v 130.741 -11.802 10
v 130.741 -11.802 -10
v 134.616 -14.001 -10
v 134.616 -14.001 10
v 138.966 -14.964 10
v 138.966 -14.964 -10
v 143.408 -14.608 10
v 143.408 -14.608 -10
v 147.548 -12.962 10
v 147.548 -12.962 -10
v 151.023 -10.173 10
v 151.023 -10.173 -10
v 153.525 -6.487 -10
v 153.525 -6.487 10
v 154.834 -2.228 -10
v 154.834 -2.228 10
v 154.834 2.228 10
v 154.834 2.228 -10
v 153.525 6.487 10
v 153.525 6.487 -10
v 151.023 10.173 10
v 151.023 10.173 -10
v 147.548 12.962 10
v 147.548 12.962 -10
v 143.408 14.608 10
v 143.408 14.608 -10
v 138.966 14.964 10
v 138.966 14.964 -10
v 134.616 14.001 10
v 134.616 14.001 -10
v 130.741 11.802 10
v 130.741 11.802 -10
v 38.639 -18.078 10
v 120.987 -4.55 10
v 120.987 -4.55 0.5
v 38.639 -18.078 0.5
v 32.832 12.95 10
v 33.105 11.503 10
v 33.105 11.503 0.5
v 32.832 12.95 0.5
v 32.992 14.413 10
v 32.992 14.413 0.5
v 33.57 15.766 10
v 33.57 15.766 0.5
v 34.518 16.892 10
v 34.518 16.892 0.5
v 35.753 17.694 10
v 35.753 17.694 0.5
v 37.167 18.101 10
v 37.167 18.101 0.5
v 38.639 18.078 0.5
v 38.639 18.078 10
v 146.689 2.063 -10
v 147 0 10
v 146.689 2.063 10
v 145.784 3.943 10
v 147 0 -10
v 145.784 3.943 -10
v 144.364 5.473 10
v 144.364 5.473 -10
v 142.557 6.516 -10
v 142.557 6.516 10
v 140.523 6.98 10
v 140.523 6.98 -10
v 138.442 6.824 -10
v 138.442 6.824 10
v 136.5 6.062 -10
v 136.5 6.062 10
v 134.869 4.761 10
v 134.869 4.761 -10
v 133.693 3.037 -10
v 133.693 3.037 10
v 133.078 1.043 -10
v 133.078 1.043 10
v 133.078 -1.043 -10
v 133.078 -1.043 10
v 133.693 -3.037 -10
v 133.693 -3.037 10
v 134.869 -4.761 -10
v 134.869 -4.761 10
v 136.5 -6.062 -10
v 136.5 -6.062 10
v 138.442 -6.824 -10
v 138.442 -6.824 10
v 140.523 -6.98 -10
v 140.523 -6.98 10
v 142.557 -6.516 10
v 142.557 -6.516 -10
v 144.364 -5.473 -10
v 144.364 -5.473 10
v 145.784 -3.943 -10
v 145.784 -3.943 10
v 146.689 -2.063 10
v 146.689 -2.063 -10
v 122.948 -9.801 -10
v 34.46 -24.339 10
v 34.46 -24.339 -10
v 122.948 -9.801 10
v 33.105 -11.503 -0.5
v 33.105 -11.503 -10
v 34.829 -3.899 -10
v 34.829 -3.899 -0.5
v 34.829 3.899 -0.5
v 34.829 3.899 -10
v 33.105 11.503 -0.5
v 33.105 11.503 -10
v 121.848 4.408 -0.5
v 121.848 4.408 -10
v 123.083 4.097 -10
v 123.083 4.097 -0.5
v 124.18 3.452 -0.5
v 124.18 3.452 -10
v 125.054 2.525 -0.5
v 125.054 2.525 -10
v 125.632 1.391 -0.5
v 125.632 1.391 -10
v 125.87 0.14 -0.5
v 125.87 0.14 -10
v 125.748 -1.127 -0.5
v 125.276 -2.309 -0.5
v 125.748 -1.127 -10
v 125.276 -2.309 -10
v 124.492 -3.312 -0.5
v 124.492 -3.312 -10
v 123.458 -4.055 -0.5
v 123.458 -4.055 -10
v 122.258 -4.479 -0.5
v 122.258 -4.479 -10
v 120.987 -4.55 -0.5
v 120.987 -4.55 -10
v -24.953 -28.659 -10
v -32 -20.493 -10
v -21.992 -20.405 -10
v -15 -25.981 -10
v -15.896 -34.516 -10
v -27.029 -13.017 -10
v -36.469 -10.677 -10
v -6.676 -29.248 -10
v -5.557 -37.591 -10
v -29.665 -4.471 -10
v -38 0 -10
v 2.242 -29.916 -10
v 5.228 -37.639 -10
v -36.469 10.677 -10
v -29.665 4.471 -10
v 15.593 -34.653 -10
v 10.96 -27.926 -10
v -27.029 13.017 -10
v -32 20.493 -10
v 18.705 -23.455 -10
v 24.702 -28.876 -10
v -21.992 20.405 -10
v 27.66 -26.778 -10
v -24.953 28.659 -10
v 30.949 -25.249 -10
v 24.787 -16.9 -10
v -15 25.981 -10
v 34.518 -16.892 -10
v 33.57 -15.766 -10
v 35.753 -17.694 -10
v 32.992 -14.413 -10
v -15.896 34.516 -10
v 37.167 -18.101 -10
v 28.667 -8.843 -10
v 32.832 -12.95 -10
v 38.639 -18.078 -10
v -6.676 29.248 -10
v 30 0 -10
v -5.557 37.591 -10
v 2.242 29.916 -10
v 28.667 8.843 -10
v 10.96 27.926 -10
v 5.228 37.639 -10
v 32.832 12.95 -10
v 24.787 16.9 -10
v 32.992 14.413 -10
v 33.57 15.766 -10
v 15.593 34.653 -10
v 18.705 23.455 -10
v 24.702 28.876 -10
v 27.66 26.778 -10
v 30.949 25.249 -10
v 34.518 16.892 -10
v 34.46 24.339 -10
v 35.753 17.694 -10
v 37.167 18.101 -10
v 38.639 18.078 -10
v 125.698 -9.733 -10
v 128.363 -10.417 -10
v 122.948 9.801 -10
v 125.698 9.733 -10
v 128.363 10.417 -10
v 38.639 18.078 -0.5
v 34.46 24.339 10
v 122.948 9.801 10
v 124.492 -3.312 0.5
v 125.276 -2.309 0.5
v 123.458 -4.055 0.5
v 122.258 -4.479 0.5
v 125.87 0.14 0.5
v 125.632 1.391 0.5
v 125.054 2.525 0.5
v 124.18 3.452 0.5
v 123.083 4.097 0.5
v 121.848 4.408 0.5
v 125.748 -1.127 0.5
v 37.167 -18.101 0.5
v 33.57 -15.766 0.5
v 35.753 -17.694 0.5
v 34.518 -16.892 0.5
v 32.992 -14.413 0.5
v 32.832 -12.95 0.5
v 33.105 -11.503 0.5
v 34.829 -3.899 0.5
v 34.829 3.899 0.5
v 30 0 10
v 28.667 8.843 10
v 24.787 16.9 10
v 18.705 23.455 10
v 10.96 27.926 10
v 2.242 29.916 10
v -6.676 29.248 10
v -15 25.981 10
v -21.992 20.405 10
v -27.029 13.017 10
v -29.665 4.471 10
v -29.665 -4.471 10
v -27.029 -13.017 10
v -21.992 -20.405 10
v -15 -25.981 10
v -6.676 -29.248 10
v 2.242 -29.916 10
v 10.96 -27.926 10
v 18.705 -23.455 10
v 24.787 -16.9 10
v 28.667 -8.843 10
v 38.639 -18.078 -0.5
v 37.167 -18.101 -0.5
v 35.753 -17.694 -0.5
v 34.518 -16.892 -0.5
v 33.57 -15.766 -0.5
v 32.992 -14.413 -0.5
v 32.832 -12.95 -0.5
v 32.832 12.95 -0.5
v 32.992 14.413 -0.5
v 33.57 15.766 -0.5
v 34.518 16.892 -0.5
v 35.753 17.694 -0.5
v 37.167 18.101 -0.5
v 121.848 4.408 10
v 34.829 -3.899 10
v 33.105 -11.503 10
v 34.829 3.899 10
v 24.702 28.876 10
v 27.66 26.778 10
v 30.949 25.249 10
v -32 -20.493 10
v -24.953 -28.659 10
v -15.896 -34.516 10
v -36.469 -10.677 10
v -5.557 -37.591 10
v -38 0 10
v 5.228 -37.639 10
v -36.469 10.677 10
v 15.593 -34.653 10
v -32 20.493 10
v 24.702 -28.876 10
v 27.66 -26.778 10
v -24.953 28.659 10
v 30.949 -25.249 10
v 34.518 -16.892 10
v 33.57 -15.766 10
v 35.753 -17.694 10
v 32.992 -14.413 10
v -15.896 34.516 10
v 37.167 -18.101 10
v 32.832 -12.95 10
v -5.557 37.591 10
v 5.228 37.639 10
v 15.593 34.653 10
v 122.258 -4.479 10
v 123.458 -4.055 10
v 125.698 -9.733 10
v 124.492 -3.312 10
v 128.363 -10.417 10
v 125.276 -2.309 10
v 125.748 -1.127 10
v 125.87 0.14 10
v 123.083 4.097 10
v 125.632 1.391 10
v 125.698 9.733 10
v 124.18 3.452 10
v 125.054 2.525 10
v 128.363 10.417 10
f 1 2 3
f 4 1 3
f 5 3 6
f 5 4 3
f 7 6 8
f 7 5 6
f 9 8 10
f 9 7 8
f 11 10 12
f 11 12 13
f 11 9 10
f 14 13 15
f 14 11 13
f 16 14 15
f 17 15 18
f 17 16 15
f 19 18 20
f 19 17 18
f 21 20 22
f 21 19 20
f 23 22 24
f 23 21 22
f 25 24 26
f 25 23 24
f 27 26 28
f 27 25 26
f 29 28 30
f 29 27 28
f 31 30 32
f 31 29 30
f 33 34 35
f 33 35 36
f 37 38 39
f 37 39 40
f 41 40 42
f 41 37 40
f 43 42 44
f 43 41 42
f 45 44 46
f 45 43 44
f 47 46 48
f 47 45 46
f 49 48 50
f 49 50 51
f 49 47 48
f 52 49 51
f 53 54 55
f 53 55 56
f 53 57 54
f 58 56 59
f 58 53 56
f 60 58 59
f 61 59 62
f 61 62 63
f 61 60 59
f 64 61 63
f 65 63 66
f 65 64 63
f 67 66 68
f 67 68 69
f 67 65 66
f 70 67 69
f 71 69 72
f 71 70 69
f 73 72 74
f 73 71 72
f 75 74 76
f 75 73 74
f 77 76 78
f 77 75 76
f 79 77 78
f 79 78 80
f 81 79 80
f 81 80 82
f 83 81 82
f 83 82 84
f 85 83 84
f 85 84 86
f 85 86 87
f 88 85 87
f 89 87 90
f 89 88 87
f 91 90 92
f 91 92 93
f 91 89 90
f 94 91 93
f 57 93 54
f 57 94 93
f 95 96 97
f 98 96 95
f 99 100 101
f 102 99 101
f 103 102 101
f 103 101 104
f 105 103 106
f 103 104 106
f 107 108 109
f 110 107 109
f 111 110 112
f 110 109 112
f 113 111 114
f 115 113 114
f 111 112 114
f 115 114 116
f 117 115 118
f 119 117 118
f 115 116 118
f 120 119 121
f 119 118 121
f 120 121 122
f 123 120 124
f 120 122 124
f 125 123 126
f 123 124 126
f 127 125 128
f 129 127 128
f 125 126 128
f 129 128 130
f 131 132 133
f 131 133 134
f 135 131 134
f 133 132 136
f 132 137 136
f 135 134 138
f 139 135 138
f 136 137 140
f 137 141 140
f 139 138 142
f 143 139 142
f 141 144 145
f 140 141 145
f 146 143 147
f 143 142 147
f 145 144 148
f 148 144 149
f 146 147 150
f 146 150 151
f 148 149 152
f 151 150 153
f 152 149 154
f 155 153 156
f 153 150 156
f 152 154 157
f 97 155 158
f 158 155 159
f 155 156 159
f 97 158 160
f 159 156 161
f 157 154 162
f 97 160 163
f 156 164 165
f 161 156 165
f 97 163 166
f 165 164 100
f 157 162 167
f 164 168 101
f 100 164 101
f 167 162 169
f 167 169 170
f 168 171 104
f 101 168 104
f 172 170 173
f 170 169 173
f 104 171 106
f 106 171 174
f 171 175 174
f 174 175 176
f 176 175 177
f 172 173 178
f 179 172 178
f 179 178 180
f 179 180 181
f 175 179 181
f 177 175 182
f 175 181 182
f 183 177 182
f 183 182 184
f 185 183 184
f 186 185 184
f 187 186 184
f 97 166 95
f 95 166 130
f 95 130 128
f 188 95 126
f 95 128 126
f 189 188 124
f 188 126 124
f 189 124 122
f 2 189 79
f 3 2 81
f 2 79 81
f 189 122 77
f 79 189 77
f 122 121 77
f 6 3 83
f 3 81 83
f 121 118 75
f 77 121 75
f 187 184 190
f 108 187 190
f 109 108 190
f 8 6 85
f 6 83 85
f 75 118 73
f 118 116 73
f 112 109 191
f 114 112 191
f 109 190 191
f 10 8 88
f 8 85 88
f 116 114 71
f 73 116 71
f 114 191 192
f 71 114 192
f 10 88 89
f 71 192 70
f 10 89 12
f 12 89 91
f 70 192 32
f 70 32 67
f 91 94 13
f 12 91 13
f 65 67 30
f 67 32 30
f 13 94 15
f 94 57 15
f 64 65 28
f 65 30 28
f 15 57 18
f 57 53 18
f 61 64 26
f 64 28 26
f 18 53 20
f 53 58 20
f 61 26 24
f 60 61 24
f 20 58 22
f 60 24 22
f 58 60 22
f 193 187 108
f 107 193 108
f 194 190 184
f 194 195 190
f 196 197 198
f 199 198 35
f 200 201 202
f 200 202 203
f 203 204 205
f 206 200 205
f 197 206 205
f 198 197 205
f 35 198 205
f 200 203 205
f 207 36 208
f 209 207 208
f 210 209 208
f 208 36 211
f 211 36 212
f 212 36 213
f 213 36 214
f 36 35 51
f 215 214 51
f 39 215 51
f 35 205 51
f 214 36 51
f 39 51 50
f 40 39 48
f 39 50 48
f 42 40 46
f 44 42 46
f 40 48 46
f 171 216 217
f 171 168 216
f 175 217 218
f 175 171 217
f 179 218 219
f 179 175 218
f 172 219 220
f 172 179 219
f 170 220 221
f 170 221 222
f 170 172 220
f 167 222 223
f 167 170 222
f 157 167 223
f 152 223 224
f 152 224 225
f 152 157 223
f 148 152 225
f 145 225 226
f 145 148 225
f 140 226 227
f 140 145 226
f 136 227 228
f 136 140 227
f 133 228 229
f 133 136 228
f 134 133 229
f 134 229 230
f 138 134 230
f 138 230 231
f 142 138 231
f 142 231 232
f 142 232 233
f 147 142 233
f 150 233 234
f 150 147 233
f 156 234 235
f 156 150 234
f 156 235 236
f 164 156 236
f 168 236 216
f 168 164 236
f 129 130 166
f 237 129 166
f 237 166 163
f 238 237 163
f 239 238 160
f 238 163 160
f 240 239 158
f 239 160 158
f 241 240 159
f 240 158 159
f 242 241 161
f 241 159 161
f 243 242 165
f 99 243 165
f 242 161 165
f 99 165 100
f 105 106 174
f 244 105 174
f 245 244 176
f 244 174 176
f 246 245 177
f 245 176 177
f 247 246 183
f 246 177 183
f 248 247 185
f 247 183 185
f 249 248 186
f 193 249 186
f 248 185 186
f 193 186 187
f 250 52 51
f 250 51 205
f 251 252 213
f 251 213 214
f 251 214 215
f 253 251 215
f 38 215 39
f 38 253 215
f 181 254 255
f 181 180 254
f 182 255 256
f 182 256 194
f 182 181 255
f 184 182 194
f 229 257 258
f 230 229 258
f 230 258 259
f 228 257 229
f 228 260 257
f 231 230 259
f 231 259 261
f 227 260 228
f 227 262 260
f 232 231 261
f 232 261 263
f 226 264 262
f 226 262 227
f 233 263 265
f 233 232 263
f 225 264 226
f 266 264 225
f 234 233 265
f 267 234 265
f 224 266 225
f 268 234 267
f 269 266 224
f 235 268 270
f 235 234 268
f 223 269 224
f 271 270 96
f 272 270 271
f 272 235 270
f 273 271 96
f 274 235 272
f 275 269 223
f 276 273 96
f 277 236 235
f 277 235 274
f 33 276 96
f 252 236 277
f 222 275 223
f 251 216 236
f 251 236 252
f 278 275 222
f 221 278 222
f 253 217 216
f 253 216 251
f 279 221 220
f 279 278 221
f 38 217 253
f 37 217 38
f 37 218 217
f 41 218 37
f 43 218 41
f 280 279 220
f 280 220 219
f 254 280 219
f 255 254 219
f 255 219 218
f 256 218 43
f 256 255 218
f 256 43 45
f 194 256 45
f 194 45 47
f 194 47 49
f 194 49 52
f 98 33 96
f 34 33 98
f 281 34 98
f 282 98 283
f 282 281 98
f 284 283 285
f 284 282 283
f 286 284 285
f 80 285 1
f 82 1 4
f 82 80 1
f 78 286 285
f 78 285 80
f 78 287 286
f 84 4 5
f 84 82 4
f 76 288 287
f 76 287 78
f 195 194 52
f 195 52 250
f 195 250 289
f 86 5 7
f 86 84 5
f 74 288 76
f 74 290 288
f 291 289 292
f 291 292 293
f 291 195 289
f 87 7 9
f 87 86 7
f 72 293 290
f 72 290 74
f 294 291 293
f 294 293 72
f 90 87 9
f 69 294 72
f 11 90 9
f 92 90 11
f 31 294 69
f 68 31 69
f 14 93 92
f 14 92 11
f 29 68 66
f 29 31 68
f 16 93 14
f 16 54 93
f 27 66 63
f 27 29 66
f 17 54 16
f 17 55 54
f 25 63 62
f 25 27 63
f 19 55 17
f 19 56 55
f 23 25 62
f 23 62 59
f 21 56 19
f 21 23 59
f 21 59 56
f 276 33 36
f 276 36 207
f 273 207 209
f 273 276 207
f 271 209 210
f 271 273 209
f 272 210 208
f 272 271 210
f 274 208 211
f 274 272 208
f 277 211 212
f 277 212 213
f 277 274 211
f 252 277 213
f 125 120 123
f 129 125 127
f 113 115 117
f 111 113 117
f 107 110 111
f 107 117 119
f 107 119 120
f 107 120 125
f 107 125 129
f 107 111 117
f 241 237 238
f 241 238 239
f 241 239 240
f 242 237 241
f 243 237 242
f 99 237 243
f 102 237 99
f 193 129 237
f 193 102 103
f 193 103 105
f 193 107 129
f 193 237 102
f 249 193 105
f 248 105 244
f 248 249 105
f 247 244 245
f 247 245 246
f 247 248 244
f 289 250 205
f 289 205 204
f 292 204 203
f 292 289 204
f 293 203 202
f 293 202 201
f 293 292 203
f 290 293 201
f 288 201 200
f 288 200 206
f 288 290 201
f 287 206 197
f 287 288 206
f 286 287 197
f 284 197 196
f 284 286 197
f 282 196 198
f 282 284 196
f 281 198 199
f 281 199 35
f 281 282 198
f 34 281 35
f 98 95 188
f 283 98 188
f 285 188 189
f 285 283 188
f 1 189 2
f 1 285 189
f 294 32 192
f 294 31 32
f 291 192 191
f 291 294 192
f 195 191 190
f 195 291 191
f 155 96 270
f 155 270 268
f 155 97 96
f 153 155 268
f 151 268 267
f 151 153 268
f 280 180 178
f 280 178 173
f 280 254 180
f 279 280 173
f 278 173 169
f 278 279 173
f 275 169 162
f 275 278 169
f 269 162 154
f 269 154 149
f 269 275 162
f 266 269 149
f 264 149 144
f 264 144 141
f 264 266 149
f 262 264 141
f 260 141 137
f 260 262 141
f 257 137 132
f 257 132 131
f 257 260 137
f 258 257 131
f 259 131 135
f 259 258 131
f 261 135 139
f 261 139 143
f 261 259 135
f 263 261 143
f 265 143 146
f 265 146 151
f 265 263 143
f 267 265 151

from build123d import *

# Parameters (mm, degrees)
SKETCH1_R           = 30
SKETCH1_R_2         = 7
BOSS_EXTRUDE1_DEPTH = 10
FILLET1_R           = 20
FILLET2_R           = 10
CUT_EXTRUDE1_DEPTH  = 9.5


with BuildPart() as part:
    # Sketch1 → Boss-Extrude1 (new body, symmetric)
    with BuildSketch(Plane.XY):
        with BuildLine():
            Line((28.309347234, -25.349178669), (127.980959562, -8.974556643))
            ThreePointArc((127.980959562, -8.974556643), (155, 0), (127.980959562, 8.974556643))
            Line((127.980959562, 8.974556643), (28.309347234, 25.349178669))
            ThreePointArc((28.309347234, 25.349178669), (-38, 0), (28.309347234, -25.349178669))
        make_face()
        Circle(SKETCH1_R, mode=Mode.SUBTRACT)
        with Locations((140, 0)):
            Circle(SKETCH1_R_2, mode=Mode.SUBTRACT)
    extrude(amount=BOSS_EXTRUDE1_DEPTH, both=True)

    # Fillet1
    fillet1_edges = [part.edges().sort_by_distance(p)[0] for p in [
        (28.309347234, 25.349178669, 0),
        (28.309347234, -25.349178669, 0),
    ]]
    fillet(fillet1_edges, radius=FILLET1_R)

    # Fillet2
    fillet2_edges = [part.edges().sort_by_distance(p)[0] for p in [
        (127.980959562, 8.974556643, 0),
        (127.980959562, -8.974556643, 0),
    ]]
    fillet(fillet2_edges, radius=FILLET2_R)

    # Sketch2 → Cut-Extrude1 (cut)
    with BuildSketch(Plane.XY.offset(10)):
        with BuildLine():
            Line((38.638691874, 18.07848713), (121.848393563, 4.408321852))
            ThreePointArc((121.848393563, 4.408321852), (125.854189802, -0.497633455), (120.986555874, -4.549909473))
            Line((120.986555874, -4.549909473), (38.638691874, -18.07848713))
            ThreePointArc((38.638691874, -18.07848713), (34.002624892, -16.364178365), (33.10514216, -11.503468916))
            ThreePointArc((33.10514216, -11.503468916), (35.046829165, 0), (33.10514216, 11.503468916))
            ThreePointArc((33.10514216, 11.503468916), (34.002624892, 16.364178365), (38.638691874, 18.07848713))
        make_face()
    cut_extrude1 = extrude(amount=-CUT_EXTRUDE1_DEPTH, mode=Mode.SUBTRACT)

    # Mirror1: Cut-Extrude1 across plane
    add(cut_extrude1.mirror(Plane.XY), mode=Mode.SUBTRACT)


solid = part.part
